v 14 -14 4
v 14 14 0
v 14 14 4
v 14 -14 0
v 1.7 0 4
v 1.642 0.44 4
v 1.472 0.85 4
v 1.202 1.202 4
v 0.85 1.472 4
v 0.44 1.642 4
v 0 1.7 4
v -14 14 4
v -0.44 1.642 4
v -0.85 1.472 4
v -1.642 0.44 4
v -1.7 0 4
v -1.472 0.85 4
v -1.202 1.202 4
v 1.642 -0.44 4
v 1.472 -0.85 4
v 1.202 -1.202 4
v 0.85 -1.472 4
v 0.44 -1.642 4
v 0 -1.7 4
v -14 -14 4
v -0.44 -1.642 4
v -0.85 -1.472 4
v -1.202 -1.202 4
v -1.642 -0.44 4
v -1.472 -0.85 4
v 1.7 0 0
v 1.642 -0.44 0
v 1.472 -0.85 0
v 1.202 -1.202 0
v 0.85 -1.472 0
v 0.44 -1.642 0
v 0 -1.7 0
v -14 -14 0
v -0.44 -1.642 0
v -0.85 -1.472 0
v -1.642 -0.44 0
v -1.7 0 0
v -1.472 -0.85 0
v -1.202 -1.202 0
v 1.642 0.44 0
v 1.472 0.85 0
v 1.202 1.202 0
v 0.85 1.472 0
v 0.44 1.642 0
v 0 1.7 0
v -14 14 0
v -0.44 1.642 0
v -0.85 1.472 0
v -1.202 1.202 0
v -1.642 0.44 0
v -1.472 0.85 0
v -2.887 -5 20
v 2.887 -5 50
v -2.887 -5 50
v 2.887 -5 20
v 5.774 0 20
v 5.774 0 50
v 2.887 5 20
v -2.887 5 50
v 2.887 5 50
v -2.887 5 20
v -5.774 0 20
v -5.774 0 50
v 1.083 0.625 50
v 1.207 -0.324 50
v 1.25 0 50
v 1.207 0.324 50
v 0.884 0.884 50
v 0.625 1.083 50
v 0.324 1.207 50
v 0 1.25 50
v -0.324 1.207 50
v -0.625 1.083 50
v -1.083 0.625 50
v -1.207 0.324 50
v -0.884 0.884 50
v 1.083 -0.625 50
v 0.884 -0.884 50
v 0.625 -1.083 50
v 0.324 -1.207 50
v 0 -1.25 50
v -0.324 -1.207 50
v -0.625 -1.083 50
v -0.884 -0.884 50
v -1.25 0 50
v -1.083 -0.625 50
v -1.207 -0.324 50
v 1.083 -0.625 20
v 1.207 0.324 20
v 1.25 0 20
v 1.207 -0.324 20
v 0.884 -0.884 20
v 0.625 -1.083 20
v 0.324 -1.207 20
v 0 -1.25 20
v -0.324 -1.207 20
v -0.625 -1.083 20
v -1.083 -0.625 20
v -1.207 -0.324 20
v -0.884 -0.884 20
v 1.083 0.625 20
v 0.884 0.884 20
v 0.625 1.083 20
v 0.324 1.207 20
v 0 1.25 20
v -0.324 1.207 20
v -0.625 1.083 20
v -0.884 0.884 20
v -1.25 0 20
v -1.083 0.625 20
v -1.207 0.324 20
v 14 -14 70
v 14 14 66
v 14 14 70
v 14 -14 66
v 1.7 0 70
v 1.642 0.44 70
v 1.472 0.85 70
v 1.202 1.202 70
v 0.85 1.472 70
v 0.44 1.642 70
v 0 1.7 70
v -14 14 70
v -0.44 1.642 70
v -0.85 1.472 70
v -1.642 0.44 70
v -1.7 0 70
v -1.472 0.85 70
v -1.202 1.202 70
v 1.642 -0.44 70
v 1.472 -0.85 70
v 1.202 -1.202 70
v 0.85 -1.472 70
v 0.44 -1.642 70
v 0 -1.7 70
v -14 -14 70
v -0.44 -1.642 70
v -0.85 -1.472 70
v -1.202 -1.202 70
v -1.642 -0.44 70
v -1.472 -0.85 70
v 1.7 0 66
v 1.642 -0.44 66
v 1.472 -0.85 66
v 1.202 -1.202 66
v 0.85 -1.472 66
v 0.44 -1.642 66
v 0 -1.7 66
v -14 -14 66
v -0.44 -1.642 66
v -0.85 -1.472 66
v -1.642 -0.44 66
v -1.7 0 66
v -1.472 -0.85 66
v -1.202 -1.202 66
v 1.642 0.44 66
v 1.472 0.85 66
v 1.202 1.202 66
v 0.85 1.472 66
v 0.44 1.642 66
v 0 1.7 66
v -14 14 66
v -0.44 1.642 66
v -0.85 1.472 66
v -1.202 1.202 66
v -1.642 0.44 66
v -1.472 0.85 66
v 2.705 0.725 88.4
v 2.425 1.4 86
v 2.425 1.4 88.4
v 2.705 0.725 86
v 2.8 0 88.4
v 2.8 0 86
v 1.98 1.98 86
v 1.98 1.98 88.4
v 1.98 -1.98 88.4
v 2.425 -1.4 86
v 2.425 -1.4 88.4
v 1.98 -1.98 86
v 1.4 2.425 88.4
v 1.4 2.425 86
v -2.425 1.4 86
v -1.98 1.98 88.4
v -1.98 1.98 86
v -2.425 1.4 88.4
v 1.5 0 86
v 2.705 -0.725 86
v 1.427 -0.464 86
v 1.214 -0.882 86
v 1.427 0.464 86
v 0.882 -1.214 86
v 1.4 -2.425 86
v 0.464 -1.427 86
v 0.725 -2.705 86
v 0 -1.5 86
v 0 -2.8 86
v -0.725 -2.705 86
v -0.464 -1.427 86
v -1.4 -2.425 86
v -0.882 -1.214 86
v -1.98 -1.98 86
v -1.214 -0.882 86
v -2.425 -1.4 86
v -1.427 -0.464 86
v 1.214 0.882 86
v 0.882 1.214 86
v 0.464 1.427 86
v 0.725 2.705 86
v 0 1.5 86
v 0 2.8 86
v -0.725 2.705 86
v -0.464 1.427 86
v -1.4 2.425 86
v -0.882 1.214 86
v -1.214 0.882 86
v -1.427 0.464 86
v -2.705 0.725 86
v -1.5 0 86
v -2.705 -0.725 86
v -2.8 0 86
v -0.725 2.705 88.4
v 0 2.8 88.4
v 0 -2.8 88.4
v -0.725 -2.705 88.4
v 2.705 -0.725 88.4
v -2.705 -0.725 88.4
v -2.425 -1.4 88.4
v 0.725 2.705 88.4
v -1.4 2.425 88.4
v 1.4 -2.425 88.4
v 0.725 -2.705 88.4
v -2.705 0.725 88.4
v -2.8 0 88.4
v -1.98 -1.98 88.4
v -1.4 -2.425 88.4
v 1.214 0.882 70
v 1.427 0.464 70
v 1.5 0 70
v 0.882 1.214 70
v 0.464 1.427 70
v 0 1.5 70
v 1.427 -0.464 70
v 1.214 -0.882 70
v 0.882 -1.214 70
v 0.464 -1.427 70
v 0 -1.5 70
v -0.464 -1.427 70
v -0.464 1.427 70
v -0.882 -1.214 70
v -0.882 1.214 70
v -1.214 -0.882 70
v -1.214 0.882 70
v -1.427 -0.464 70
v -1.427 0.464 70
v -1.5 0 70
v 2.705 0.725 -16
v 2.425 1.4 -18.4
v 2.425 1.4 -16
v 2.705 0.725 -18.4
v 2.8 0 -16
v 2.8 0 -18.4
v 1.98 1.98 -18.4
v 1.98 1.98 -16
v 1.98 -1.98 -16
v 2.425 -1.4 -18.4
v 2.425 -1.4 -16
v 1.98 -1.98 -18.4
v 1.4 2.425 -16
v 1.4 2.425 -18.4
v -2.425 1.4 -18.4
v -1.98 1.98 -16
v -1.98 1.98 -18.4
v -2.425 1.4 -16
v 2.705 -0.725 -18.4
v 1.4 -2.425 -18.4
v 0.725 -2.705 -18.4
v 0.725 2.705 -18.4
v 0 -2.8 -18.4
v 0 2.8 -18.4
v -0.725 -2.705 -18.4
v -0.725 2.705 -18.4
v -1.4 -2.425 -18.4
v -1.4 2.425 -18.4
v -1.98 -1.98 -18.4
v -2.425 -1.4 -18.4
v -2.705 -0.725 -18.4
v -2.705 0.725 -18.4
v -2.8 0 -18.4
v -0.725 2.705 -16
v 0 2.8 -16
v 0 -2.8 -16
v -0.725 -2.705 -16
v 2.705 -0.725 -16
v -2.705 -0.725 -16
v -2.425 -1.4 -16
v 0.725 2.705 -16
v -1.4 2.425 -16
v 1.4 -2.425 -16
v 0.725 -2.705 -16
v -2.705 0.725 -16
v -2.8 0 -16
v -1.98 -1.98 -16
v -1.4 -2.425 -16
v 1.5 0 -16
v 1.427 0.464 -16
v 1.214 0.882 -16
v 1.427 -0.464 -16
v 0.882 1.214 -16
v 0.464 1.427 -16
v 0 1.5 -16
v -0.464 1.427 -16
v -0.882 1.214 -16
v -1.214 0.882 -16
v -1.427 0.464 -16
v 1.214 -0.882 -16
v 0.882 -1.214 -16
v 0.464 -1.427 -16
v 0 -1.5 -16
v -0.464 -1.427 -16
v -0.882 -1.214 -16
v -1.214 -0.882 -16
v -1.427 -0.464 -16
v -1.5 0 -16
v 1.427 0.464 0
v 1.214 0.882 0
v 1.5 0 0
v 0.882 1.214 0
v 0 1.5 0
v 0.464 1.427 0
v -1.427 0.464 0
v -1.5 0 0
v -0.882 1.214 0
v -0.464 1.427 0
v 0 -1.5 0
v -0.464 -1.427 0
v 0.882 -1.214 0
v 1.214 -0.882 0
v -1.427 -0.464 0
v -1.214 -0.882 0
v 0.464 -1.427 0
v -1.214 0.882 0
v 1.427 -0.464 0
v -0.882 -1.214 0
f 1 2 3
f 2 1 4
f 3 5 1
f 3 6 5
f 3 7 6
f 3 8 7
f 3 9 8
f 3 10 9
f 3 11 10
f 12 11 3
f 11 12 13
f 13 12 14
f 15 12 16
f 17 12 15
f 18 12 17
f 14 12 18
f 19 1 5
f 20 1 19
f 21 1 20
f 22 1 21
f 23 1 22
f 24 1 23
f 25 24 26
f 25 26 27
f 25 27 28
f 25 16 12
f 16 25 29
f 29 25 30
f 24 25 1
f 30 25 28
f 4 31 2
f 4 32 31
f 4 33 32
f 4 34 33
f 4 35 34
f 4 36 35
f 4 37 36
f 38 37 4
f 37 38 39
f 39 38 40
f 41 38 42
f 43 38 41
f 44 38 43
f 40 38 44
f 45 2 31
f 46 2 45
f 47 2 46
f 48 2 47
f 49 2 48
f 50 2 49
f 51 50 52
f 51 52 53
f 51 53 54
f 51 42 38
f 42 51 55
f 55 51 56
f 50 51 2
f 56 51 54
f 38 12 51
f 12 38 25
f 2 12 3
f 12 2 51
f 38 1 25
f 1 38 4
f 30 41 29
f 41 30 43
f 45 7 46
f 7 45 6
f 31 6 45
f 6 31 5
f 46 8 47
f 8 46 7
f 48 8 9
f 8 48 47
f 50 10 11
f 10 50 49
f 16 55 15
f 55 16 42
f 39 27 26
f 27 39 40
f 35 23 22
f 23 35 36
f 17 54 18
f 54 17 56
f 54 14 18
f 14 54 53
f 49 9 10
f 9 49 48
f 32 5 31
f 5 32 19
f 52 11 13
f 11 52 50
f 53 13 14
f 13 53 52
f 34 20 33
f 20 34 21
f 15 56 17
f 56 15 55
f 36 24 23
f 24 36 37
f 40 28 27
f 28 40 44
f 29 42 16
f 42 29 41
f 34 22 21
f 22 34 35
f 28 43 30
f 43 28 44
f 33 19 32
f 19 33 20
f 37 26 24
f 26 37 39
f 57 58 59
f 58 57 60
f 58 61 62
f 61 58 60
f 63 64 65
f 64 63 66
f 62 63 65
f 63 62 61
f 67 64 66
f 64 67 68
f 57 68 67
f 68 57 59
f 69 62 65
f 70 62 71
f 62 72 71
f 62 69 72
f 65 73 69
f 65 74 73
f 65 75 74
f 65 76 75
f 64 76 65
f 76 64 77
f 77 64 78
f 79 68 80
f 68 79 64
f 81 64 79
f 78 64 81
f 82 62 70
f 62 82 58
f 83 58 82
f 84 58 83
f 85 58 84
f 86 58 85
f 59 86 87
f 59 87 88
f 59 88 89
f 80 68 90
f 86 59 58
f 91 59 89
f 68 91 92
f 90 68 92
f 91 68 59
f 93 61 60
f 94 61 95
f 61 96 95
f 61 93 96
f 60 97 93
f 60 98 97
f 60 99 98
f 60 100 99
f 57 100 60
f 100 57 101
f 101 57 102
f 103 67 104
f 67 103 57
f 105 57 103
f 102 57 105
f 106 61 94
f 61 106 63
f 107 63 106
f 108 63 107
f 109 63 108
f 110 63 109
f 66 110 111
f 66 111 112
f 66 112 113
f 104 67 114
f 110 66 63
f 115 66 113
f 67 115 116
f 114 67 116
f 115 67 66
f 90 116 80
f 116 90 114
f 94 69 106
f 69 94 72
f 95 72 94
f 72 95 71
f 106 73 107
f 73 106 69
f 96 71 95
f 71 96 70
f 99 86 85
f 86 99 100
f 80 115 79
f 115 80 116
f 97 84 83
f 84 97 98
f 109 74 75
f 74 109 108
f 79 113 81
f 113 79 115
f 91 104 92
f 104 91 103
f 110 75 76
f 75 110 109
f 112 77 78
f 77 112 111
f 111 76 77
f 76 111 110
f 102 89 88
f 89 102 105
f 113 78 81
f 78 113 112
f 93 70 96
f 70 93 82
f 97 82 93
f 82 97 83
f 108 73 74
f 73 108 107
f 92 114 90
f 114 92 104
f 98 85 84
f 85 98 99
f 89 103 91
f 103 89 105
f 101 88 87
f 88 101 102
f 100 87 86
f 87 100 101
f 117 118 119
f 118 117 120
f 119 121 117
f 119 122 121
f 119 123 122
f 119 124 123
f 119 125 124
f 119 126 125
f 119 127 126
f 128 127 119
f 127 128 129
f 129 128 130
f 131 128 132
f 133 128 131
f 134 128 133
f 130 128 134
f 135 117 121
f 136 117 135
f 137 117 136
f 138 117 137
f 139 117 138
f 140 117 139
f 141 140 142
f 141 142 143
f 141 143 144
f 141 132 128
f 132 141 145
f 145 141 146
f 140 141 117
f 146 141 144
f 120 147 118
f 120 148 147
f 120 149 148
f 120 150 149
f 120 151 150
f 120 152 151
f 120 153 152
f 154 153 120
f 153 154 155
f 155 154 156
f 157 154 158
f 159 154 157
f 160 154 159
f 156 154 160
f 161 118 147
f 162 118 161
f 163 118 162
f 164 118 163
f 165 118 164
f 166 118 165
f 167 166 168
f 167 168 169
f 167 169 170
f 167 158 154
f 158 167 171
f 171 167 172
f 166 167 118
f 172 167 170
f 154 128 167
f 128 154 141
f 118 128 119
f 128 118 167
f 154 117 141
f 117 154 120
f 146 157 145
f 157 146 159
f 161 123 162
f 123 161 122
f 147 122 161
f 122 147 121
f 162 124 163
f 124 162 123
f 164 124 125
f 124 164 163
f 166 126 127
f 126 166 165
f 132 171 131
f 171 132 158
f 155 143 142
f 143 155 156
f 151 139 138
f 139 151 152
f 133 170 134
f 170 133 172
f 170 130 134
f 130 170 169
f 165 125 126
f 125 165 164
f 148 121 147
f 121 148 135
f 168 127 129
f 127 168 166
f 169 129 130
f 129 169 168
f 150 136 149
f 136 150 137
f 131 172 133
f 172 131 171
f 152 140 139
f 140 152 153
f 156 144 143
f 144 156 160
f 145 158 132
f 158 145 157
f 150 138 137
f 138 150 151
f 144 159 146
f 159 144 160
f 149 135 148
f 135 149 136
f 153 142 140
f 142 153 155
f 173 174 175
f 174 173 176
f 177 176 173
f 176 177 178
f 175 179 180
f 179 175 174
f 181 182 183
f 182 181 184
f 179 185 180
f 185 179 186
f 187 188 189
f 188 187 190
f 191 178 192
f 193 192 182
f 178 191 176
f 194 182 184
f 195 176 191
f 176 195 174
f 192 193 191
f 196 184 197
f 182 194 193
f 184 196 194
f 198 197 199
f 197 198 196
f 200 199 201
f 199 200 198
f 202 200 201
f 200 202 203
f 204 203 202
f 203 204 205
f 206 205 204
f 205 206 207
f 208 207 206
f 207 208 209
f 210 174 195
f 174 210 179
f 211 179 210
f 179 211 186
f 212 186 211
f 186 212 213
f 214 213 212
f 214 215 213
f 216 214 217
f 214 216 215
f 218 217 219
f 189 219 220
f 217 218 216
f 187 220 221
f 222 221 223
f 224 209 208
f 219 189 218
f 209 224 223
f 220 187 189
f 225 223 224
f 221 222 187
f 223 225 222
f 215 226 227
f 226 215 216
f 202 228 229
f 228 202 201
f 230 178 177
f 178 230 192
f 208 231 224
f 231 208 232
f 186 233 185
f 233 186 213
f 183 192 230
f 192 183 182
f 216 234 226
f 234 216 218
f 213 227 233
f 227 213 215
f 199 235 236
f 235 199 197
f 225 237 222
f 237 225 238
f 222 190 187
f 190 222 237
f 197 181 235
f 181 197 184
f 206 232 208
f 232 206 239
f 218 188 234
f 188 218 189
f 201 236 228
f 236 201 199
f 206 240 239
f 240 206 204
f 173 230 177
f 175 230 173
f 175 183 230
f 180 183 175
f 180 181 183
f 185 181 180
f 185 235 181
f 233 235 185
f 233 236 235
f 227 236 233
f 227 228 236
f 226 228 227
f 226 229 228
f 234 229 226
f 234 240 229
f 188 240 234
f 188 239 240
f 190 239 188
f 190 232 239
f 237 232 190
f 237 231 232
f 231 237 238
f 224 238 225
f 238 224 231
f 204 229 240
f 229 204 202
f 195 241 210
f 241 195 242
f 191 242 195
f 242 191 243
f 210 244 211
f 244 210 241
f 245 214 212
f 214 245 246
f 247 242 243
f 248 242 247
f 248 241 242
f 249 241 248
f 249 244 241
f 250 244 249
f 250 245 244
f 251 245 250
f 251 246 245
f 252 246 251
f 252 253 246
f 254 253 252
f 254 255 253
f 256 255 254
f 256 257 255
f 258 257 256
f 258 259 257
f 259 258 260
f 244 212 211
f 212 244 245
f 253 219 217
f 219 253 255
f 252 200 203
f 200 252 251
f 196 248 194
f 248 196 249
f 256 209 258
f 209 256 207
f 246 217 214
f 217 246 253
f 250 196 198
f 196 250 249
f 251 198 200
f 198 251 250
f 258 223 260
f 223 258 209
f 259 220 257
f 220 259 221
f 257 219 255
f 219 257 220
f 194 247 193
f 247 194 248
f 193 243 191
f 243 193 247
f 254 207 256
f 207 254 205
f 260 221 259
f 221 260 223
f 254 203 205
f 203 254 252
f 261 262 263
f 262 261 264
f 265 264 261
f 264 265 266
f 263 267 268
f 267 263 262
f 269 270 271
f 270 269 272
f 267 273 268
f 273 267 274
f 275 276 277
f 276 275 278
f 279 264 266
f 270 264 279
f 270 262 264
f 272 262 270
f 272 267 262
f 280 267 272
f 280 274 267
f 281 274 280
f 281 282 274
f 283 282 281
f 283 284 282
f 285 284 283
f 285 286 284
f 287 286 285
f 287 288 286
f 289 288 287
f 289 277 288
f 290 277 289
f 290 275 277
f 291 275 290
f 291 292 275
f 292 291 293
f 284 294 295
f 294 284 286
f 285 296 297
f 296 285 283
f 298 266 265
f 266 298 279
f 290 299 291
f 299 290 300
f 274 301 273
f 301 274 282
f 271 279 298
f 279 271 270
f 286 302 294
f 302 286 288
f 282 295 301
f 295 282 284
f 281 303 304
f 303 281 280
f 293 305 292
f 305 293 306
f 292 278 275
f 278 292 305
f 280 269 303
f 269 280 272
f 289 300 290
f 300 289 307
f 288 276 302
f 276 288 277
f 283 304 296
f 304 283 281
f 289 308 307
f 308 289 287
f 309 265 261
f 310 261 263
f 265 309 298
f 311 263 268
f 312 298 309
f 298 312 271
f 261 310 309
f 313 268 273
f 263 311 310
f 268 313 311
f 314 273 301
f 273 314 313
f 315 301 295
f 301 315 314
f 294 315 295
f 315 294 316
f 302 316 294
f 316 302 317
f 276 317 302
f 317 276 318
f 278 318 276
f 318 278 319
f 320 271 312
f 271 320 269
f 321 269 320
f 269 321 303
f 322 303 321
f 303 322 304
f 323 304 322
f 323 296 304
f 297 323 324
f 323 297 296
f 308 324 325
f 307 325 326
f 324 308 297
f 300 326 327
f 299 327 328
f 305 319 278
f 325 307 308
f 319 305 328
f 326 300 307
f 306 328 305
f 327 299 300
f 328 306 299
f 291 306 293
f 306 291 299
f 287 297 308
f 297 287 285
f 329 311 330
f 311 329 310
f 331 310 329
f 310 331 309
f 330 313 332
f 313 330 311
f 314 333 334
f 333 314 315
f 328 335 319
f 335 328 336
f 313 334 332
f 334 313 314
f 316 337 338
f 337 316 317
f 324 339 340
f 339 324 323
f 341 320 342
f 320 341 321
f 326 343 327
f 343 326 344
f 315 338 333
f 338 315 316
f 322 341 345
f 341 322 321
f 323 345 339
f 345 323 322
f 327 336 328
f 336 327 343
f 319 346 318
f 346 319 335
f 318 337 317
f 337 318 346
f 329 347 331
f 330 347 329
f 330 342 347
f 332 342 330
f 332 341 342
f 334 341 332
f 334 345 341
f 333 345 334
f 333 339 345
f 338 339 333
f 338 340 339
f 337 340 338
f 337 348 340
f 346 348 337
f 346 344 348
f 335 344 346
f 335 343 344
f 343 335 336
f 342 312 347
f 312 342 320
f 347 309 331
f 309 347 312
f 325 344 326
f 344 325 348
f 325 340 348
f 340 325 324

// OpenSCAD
// file: ../print/common.scad
// ============================================================================
// common.scad - shared parameters and helpers for EEELunarRover printed parts
// ----------------------------------------------------------------------------
// Units: millimetres. Every dimension below is taken either from the EEEBug
// V3.1 laser-cut CAD (mech/chassis.svg, measured) or from a verified component
// datasheet (see mech/rover_layout.md section "Verified part dimensions").
//
// Printer envelope: 200 x 200 x 200 mm PLA. We deliberately keep every part
// under 180 mm in its longest axis (lab guidance: do not use the full bed).
// ============================================================================

$fn = 60;
eps = 0.05;

// ---------- Fasteners (verified: M3 nylon hex A/F measured 5.4-5.6 mm) -------
M3_CLEAR  = 3.4;   // clearance for an M3 screw / standoff thread
M3_TAP    = 2.9;   // pilot for self-tapping an M3 into PLA
M3_HEAD   = 6.2;   // M3 pan-head clearance diameter
M3_HEXAF  = 5.8;   // nylon M3 hex standoff/nut across-flats + fit clearance
WALL      = 2.0;   // default wall (5 perimeters @ 0.4 mm nozzle)

// ---------- Chassis: EEEBug V3.1 (from mech/chassis.svg) ---------------------
CH_W   = 95.0;     // chassis width  (X)
CH_L   = 205.0;    // chassis length (Y)
CH_T   = 3.0;      // 3 mm acrylic
AXLE_Y = 105.0;    // drive-wheel centreline (waist pinches 95->85 mm, y 96-114)

// Central M3 anchor rectangle straddling the axle (chassis coords, Ø3.1 holes):
//   (10.5, 95) (84.5, 95) (10.5, 129) (84.5, 129)  ->  74 mm (X) x 34 mm (Y)
ANCHOR_PITCH_X = 74.0;
ANCHOR_PITCH_Y = 34.0;

// Standard modular interface: every small sensor mount bolts on with
// 2x M3 at this pitch.
DOCK_PITCH = 12.0;

// ---------- Verified component dimensions ------------------------------------
// OSRAM SFH 300 phototransistor: 5 mm T-1 3/4 radial, body Ø5.1, ~8.6 tall,
//   leads 2.54 mm pitch.
SFH300_DIA = 5.1;
// Murata MA40S4R 40 kHz ultrasonic Rx: body Ø9.9, 7.1 tall, leads 5.0 mm pitch.
US_DIA   = 9.9;
US_H     = 7.1;
US_PITCH = 5.0;
// Honeywell SS49E linear Hall: flat package 4.1 (W) x 1.7 (thk) x 3.0 (H),
//   3 leads at 1.27 mm pitch.
HALL_W = 4.1;
HALL_T = 1.7;
HALL_H = 3.0;
// Roth perfboards (FR4, 1.5 mm): RE015 = 40.5 x 40.0 ; RE016 = 68.58 x 67.94.
PB_SMALL = [40.5, 40.0, 1.5];
PB_LARGE = [68.58, 67.94, 1.5];

// ---------- helpers ----------------------------------------------------------
module m3_clear(h = 30) { translate([0,0,-eps]) cylinder(d = M3_CLEAR, h = h + 2*eps); }
module m3_tap(h = 30)   { translate([0,0,-eps]) cylinder(d = M3_TAP,   h = h + 2*eps); }
module hexAF(af, h)     { cylinder(r = af/sqrt(3), h = h, $fn = 6); }

// 2x M3 clearance holes at DOCK_PITCH, centred on the origin along X.
module dock_holes(h = 30) {
    for (s = [-1, 1]) translate([s*DOCK_PITCH/2, 0, 0]) m3_clear(h);
}
// main file
// corner_joint.scad - explains how a pillar attaches the two decks (diagram)
//   -D mode="exploded"  -> parts pulled apart, screws shown
//   -D mode="section"   -> assembled and cut in half, screws visible inside
include <../print/common.scad>

DT = 4;        // deck thickness
PH = 30;       // pillar height (short, for the diagram)
SLAB = 28;     // a small square of deck around the corner hole
mode = "exploded";
EX = (mode == "exploded") ? 16 : 0;    // explosion gap

module deck_slab() {
    difference() {
        translate([-SLAB/2,-SLAB/2,0]) cube([SLAB, SLAB, DT]);
        translate([0,0,-eps]) cylinder(d = M3_CLEAR, h = DT+2*eps, $fn = 24);   // Ø3.4 corner hole
    }
}
module pil() {
    difference() {
        cylinder(d = 10/cos(30), h = PH, $fn = 6);
        translate([0,0,-eps]) cylinder(d = 2.5, h = PH+2*eps, $fn = 24);        // Ø2.5 self-tap pilot
    }
}
module screw_down(len) { color("FireBrick") { cylinder(d=5.6,h=2.4,$fn=24); translate([0,0,-len]) cylinder(d=3,h=len,$fn=20); } }
module screw_up(len)   { color("FireBrick") { translate([0,0,-2.4]) cylinder(d=5.6,h=2.4,$fn=24); cylinder(d=3,h=len,$fn=20); } }

zb = 0;                 // bottom deck base
zp = DT + EX;           // pillar base
ztop = DT + PH + 2*EX;  // top deck base

module build() {
    color("Silver")    translate([0,0,zb])   deck_slab();   // bottom deck
    color("Goldenrod") translate([0,0,zp])   pil();         // pillar
    color("Silver")    translate([0,0,ztop]) deck_slab();   // top deck
    translate([0,0, ztop+DT + EX]) screw_down(DT+12);       // top screw -> down into pillar
    translate([0,0, zb - EX])      screw_up(DT+12);         // bottom screw -> up into pillar
}

if (mode == "section")
    intersection() { build(); translate([-50,-50,-20]) cube([100,50,200]); }   // cut at y=0
else
    build();
